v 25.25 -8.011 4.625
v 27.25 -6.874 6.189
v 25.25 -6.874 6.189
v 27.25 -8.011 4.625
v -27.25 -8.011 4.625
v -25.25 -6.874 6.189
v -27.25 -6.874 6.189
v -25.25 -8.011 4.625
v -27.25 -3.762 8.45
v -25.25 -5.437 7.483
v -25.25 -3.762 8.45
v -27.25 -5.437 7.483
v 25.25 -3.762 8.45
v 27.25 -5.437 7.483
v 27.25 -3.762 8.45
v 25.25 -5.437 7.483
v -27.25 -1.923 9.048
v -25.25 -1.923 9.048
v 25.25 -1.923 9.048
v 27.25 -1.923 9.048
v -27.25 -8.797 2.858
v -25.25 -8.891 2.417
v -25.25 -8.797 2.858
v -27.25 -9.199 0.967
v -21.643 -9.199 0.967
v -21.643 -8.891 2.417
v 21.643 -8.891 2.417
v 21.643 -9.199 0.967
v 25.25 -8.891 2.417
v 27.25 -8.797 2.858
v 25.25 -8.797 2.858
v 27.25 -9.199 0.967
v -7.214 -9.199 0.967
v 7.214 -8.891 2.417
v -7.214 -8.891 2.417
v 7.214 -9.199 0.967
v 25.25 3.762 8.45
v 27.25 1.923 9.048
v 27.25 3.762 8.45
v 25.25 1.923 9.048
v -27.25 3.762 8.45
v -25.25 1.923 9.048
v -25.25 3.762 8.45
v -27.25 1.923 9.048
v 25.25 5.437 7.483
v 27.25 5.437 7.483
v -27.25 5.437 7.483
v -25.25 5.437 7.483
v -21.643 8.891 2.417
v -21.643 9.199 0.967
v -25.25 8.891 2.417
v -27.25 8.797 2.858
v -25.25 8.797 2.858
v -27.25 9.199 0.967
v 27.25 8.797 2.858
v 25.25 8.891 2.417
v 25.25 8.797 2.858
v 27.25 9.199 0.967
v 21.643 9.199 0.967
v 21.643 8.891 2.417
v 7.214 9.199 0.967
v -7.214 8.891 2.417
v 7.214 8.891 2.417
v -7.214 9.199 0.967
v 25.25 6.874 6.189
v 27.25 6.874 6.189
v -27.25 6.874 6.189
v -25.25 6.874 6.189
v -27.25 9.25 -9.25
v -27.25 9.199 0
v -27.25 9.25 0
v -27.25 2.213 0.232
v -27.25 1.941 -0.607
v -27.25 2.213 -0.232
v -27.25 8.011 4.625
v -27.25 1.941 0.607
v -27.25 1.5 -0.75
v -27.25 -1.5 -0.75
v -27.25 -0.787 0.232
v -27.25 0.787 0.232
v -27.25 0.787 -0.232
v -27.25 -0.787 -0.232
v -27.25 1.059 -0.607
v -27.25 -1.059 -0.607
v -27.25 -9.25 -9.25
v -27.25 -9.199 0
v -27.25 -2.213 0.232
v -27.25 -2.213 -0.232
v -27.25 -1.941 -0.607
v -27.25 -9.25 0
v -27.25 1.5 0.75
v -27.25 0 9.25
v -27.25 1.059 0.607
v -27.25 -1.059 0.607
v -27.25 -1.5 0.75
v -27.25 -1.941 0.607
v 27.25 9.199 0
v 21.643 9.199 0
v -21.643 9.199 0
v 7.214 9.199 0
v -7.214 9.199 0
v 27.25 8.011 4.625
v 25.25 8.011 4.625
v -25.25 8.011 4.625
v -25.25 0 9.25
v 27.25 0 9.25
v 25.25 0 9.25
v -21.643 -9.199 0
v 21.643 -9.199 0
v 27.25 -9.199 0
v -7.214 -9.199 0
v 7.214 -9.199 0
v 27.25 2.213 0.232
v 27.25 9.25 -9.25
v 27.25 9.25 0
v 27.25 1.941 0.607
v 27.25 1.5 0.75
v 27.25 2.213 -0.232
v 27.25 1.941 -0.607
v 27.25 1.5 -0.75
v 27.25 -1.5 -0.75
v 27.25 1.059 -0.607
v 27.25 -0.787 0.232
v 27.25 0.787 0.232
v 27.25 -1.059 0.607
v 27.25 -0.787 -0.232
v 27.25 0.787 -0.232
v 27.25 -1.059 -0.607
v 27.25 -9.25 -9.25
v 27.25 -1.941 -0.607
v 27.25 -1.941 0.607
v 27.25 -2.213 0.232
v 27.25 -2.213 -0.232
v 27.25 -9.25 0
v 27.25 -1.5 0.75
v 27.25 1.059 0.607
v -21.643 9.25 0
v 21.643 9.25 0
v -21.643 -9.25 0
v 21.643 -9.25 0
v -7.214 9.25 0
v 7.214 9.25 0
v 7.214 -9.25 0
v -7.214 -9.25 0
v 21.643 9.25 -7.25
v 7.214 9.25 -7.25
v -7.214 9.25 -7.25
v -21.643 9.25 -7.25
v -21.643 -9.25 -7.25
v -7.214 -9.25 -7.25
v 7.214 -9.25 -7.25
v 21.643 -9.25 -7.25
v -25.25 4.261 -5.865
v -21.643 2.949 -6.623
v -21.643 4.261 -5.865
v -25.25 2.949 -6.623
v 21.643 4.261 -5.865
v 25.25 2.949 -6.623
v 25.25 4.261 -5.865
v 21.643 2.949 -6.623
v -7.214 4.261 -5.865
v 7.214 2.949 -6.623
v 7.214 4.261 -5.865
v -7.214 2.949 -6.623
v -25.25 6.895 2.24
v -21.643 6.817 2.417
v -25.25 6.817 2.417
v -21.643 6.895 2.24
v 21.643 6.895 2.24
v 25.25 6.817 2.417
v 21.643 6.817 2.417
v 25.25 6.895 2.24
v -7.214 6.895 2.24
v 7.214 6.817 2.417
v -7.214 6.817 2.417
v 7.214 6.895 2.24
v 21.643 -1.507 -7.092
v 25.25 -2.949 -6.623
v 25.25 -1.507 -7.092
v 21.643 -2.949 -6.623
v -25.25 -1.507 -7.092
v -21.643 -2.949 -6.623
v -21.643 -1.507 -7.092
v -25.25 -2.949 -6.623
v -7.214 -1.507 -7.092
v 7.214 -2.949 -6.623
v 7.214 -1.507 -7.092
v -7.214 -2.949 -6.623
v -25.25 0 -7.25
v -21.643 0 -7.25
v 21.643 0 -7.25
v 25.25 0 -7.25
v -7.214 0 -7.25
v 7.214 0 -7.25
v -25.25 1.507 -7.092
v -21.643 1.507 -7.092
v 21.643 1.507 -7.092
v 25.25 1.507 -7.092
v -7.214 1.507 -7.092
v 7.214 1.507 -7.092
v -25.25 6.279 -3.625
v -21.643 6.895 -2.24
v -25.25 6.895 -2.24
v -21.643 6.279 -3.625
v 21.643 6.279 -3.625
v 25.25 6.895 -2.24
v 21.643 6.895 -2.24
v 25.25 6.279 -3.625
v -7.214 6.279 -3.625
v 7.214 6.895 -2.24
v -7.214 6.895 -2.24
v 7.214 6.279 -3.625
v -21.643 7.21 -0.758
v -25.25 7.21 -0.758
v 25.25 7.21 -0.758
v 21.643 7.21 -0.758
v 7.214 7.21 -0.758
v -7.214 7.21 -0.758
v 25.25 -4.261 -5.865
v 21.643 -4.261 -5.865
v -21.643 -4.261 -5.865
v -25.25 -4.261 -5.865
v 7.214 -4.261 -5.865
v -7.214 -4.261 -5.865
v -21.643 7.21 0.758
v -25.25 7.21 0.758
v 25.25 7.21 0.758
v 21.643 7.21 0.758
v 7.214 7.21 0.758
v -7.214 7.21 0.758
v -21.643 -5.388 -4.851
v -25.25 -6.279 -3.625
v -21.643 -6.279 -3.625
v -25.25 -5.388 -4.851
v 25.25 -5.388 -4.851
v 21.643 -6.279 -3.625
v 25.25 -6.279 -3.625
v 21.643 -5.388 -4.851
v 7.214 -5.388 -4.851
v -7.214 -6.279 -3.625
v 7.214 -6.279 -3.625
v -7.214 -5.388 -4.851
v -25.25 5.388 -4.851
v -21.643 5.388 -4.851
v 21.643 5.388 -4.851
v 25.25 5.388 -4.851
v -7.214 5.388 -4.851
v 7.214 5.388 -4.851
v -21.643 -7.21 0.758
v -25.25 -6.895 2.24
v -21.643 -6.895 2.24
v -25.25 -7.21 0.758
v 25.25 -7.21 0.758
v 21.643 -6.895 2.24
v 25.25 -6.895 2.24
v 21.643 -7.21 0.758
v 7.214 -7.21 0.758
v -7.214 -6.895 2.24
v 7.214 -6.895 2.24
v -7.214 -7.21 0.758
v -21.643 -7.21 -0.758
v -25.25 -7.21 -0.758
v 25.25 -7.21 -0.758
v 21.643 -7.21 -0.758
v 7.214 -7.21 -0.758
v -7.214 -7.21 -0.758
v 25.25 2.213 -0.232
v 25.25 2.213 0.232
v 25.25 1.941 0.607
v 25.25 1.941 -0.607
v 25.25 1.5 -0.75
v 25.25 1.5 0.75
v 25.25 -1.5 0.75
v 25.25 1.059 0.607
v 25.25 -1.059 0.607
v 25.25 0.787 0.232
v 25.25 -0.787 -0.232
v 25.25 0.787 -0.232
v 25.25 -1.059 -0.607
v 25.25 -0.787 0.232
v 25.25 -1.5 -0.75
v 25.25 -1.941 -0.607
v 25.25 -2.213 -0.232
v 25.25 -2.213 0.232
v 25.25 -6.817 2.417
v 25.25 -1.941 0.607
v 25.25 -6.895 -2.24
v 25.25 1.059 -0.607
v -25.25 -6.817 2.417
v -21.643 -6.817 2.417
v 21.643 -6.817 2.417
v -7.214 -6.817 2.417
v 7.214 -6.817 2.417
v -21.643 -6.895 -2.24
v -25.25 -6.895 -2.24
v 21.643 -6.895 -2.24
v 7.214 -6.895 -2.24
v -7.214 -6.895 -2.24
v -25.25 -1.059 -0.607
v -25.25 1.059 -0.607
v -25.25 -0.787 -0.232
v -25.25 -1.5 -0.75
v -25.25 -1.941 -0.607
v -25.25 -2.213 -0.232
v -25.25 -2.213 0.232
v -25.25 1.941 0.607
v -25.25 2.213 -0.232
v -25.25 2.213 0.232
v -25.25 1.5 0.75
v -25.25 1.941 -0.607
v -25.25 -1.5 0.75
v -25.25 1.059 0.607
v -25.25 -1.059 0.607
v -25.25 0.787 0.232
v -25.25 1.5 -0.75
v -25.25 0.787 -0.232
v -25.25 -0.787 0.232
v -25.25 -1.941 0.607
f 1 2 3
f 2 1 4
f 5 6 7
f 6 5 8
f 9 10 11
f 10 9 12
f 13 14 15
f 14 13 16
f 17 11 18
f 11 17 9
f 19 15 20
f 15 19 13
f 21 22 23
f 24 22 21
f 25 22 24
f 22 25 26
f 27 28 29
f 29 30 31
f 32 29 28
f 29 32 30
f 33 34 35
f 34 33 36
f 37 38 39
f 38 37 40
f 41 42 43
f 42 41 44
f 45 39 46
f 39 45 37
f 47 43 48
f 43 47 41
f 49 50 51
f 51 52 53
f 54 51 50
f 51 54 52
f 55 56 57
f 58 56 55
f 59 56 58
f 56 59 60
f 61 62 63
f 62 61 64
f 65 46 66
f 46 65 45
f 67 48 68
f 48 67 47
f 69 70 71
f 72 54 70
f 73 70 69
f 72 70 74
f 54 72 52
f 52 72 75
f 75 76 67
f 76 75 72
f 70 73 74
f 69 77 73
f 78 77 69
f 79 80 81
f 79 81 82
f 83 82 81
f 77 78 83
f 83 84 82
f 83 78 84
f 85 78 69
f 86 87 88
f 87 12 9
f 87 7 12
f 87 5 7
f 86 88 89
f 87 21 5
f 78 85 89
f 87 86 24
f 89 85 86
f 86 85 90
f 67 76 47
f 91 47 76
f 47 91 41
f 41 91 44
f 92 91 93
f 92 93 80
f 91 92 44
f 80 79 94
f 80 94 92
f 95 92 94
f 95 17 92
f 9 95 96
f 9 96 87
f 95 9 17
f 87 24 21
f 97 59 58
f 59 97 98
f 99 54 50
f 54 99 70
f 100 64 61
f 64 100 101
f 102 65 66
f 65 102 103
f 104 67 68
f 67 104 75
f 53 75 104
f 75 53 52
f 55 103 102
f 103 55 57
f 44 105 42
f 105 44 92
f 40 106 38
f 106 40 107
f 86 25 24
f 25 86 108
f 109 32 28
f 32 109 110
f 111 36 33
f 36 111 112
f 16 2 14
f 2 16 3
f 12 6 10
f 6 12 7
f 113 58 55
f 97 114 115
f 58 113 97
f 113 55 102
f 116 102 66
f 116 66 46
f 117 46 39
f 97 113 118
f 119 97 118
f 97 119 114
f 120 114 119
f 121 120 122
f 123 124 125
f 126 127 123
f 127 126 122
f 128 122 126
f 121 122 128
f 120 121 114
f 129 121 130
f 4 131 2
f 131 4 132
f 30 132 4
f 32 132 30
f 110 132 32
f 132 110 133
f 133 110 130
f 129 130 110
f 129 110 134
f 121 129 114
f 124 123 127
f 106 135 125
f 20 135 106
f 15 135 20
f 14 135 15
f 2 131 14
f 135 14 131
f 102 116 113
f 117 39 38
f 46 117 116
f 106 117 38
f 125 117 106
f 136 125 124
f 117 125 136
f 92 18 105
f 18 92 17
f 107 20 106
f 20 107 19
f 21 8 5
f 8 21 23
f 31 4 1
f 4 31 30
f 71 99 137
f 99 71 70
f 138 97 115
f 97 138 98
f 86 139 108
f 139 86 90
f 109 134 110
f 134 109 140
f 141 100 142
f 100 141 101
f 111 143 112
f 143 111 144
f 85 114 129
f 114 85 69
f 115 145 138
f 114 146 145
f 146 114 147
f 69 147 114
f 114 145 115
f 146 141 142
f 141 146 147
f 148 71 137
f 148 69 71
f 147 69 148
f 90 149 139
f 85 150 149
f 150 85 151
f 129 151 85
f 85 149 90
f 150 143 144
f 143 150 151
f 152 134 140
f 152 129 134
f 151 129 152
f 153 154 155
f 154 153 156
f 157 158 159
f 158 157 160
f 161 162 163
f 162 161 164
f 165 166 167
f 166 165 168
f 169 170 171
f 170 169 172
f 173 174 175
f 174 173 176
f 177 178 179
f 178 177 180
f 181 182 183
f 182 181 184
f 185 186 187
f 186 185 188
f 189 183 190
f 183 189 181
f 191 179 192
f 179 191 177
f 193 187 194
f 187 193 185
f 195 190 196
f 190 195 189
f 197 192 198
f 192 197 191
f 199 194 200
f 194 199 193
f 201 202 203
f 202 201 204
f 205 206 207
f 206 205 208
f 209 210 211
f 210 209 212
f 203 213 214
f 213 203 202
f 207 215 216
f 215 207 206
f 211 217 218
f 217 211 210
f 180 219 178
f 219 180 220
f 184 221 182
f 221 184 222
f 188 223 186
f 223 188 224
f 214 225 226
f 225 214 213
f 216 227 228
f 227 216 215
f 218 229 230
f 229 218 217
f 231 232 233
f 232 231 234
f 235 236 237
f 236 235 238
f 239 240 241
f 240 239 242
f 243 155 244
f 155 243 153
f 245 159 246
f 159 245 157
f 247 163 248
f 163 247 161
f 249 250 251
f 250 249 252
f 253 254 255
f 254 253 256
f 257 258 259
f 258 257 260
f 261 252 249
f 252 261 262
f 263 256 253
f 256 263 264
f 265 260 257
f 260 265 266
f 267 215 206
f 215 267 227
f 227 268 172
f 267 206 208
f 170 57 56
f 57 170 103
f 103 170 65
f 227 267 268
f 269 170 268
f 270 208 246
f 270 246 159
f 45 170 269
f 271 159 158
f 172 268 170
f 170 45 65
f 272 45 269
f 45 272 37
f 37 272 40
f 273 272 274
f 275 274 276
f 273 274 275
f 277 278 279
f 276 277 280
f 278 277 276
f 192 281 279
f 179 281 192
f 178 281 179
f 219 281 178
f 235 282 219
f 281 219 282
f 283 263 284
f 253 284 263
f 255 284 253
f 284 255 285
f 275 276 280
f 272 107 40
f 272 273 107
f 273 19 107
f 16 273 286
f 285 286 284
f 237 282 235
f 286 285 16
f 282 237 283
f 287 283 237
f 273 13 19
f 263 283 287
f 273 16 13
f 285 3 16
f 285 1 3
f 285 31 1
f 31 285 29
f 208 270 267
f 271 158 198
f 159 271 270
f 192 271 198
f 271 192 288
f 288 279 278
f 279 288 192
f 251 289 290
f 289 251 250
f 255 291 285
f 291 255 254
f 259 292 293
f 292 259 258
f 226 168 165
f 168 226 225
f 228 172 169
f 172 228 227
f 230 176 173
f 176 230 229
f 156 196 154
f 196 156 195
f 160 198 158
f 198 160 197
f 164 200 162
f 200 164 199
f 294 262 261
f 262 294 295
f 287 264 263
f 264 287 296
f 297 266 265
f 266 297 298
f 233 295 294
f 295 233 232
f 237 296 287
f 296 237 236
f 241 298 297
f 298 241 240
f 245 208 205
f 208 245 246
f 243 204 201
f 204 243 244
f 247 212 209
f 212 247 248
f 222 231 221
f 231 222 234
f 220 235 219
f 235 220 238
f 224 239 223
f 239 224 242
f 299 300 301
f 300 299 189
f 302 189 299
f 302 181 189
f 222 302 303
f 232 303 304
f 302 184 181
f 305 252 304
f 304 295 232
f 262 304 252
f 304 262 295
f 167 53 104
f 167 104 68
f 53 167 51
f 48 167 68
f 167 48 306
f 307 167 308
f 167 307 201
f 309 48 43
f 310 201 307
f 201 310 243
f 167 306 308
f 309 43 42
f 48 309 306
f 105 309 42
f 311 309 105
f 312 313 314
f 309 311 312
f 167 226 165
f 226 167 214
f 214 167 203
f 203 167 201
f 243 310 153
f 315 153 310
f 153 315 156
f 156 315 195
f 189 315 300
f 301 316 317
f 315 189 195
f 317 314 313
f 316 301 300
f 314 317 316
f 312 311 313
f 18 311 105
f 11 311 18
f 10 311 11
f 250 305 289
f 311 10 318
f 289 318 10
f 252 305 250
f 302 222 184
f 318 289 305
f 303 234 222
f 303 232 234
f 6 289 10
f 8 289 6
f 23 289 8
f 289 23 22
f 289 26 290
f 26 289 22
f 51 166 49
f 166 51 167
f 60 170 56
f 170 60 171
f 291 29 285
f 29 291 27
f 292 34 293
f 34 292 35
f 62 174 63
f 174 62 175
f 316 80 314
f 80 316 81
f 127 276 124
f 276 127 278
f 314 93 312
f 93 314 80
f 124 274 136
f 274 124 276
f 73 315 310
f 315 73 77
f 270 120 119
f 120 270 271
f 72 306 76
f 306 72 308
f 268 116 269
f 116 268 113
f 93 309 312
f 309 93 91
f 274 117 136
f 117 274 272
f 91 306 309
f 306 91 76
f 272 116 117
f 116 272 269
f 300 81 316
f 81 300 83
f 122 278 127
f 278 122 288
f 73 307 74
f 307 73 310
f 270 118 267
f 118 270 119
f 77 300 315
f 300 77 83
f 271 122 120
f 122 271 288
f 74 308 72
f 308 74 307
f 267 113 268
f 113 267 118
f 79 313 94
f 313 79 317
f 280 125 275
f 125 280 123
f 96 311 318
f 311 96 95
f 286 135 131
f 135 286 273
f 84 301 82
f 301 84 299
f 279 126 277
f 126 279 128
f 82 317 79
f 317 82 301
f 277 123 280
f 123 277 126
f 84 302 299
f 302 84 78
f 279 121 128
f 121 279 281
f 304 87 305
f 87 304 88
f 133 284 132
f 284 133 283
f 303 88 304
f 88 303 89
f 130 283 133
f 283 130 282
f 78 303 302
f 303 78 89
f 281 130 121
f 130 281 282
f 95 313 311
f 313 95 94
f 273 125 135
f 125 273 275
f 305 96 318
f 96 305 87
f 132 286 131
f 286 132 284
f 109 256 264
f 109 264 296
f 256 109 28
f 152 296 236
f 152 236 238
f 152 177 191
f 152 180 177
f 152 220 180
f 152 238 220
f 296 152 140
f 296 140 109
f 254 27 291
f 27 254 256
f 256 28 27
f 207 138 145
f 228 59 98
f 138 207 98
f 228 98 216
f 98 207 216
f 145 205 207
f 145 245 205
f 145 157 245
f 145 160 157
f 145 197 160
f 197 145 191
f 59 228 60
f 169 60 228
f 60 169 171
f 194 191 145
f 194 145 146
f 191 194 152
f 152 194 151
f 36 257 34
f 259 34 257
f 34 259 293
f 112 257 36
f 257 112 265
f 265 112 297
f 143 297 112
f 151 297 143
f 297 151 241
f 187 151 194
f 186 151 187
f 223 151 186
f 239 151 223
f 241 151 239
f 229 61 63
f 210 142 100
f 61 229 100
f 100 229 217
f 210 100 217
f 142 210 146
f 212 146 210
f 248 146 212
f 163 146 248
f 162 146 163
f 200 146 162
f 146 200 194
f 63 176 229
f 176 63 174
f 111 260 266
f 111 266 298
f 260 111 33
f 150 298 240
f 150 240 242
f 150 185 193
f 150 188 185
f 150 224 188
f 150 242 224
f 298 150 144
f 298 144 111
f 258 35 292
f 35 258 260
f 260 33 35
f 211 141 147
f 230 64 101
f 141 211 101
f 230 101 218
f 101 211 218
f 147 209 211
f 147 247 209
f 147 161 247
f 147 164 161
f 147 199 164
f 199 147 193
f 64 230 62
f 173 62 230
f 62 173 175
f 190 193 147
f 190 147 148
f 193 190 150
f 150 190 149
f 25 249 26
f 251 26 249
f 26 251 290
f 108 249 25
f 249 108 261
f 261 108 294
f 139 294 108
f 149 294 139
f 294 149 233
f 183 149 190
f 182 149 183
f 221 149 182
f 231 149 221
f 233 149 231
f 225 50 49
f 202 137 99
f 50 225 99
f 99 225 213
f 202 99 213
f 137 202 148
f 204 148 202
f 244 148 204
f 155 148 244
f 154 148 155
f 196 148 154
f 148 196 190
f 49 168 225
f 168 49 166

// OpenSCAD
module xhole(radius, length) {
	rotate(a=[0,90,0]) cylinder(r=radius,h=length+1,center=true, $fn=10);
}

module batteryClip(width, length, thickness) {
	difference() {
		union() {
			rotate([0,90,0]) cylinder(r=thickness+width/2,h=2*thickness+length,$fn=30,center=true);
			translate([0,0,-thickness/2-width/4]) cube([2*thickness+length,2*thickness+width,thickness+width/2], center=true);
		}
		rotate([0,90,0]) cylinder(r=width/2,h=length,$fn=30,center=true);
		translate([0,0,width/1.5]) cube([length,width+2*thickness+1,width],center=true);
		translate([0,1.5,0]) xhole(.75,length+2*thickness+1);
		translate([0,-1.5,0]) xhole(.75,length+2*thickness+1);
		translate([length/3.5,0,0]) cube([length/3.5,width+2*thickness+1,width], center=true);
		translate([-length/3.5,0,0]) cube([length/3.5,width+2*thickness+1,width], center=true);
	}
}

// Dsize
*translate([0,-60,0]) batteryClip(34.2, 61.5, 2);
// C size
*translate([0,-25,0]) batteryClip(26.2, 50, 2);
// AA size
batteryClip(14.5,50.5,2);
// AAA size
*translate([0,20,0]) batteryClip(10.5,44.5,2);
